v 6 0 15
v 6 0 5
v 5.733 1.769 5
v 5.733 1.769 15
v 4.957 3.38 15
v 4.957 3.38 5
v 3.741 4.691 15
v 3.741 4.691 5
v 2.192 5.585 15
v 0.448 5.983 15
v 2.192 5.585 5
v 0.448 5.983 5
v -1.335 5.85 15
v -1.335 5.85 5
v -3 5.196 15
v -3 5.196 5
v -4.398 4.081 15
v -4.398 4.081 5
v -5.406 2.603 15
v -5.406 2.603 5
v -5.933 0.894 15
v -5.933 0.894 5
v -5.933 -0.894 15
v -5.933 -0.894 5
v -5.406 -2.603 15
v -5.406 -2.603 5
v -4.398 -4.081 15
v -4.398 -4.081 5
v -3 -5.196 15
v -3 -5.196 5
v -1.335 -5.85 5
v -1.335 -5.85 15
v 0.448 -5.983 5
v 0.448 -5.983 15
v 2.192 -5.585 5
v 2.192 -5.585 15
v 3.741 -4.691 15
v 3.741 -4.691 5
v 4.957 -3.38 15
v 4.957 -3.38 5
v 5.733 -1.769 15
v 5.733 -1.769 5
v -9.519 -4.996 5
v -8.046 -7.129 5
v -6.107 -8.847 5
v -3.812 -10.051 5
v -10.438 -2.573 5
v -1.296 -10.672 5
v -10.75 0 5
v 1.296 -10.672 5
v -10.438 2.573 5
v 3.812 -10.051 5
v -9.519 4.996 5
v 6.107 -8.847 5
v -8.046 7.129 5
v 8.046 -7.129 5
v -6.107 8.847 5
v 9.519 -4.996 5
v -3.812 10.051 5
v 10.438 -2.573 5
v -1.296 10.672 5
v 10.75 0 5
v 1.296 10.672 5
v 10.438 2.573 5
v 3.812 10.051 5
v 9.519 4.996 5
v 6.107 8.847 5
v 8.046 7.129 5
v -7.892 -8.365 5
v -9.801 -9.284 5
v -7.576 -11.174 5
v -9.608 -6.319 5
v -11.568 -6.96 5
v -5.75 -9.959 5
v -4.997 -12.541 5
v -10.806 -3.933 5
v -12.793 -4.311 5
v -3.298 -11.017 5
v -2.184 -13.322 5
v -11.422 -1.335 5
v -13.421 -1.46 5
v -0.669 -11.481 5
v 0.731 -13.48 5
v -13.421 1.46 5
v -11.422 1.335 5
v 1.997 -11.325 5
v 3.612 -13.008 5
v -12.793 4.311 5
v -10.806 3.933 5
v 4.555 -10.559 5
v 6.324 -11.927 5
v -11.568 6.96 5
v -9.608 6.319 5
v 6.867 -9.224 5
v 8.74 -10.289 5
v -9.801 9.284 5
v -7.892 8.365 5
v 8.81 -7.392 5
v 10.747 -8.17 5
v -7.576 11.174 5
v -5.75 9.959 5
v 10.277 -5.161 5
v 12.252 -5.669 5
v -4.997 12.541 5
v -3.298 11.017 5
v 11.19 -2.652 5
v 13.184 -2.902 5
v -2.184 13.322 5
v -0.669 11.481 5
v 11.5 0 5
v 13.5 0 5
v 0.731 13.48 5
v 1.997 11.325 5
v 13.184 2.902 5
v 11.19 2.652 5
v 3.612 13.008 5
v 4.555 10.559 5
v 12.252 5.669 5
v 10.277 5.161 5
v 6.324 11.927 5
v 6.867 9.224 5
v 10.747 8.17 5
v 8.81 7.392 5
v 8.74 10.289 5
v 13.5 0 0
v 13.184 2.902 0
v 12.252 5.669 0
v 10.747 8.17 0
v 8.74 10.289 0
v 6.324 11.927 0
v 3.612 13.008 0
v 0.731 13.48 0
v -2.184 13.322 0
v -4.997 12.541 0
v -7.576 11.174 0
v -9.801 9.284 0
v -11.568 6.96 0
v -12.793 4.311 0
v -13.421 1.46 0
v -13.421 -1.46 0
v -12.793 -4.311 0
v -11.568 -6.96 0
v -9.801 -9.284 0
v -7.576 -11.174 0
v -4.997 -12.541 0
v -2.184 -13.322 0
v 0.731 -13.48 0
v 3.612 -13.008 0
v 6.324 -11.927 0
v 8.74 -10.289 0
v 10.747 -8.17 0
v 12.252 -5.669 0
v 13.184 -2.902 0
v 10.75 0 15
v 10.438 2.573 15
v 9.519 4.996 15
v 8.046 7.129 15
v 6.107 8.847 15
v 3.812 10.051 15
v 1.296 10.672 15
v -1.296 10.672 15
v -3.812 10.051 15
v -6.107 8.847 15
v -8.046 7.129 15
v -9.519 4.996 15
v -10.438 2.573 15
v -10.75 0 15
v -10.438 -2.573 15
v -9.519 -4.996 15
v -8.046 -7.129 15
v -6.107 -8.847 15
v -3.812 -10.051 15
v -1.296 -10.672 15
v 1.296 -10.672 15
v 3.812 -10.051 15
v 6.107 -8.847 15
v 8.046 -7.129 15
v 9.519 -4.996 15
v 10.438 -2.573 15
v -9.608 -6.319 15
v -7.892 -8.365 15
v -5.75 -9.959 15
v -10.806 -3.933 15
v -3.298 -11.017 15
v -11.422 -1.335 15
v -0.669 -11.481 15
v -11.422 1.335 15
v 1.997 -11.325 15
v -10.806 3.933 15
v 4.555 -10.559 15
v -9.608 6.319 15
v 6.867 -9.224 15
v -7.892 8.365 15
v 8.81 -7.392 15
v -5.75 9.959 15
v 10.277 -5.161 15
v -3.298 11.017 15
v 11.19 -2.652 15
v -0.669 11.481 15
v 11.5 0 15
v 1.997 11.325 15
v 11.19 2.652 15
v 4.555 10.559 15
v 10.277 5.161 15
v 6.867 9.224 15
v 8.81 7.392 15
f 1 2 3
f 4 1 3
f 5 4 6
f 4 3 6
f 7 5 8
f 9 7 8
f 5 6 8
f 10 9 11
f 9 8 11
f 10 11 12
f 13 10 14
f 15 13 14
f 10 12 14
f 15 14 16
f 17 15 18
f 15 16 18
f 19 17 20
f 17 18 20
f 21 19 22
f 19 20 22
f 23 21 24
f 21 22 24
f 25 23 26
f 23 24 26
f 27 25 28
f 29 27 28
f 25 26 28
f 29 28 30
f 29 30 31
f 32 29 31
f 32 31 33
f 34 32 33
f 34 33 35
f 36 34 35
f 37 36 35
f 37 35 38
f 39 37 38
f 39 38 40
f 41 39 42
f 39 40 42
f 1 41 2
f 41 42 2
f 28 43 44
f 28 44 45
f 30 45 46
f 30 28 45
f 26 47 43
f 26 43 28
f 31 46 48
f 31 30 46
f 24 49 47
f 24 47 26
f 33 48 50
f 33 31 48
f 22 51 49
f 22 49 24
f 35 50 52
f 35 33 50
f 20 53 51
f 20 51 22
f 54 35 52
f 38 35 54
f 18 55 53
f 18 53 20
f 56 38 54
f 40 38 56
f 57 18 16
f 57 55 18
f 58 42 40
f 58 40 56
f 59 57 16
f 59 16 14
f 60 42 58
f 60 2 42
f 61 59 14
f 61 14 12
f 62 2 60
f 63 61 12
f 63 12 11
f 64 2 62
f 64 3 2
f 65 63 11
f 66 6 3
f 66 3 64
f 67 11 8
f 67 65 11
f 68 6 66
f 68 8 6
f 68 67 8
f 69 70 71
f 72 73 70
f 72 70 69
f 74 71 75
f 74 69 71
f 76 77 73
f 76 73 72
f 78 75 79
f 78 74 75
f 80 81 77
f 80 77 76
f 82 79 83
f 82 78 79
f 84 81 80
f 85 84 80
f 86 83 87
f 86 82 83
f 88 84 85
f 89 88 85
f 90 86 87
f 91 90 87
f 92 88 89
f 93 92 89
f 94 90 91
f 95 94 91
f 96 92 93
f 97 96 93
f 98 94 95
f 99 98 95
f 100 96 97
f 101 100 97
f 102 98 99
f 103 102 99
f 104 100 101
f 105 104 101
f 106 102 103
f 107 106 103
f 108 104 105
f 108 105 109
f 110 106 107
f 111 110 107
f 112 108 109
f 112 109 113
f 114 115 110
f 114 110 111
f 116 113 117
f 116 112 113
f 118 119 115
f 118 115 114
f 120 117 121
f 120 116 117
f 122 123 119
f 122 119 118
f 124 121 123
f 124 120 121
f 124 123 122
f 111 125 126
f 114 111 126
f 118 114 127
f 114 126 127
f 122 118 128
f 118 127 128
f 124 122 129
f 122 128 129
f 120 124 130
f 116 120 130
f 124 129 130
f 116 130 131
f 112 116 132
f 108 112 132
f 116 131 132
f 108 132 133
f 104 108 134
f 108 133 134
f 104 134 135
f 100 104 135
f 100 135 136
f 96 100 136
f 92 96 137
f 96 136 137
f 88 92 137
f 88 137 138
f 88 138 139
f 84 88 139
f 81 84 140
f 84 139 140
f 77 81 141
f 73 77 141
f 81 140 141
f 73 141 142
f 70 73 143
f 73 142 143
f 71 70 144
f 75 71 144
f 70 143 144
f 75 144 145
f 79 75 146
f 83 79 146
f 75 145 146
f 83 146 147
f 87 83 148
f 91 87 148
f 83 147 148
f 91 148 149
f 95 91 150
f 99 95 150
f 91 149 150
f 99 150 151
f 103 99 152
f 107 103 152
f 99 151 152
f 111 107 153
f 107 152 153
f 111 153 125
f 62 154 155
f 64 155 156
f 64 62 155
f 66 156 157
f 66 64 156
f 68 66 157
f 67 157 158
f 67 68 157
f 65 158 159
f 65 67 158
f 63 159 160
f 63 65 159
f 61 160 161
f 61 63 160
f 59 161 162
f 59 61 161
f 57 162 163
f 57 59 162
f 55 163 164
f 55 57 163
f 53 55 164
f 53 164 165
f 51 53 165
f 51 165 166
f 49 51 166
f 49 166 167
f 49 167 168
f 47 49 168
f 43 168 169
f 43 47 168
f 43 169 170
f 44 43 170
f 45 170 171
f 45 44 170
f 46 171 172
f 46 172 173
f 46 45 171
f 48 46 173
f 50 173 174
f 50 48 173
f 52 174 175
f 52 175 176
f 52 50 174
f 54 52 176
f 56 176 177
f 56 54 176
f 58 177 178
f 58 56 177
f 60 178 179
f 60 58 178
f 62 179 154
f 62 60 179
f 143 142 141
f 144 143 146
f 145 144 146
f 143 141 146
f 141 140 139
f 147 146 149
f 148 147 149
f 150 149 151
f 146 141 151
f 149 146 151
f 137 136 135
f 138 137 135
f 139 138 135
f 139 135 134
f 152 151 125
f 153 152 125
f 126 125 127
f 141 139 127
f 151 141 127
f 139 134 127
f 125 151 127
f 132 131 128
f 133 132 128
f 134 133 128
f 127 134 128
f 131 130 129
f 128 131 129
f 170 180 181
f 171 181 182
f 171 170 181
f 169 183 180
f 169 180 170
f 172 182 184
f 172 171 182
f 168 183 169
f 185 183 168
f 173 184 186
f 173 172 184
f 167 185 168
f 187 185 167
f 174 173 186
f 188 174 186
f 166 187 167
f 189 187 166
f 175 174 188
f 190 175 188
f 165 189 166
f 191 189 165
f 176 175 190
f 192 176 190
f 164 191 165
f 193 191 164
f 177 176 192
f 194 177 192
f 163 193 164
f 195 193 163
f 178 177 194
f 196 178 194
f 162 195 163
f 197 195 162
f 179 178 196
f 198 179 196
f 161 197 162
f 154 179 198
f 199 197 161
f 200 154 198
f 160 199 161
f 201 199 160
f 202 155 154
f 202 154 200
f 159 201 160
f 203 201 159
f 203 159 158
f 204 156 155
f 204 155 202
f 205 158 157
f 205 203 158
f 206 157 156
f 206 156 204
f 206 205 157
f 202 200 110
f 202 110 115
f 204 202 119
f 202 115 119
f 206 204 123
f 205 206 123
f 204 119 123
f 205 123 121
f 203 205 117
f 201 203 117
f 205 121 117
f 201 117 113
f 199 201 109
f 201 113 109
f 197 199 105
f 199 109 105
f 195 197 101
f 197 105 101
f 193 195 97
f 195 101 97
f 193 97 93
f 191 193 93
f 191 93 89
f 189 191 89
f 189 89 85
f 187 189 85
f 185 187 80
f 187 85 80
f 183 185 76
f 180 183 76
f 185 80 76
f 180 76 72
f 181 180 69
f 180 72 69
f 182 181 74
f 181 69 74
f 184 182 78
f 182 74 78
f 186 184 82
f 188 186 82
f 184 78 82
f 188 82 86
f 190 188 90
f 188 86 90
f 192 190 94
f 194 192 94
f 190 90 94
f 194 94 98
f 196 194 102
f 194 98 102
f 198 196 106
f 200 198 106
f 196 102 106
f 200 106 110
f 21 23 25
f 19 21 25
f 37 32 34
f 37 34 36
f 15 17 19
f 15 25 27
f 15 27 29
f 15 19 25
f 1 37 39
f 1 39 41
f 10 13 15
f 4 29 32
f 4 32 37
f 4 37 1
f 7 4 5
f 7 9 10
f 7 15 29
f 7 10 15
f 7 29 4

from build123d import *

# Parameters (mm, degrees)
SKETCH1_R           = 13.5
BOSS_EXTRUDE1_DEPTH = 5
SKETCH2_R           = 11.5
SKETCH2_R_2         = 10.75
BOSS_EXTRUDE2_DEPTH = 10
SKETCH3_R           = 6
BOSS_EXTRUDE3_DEPTH = 10


with BuildPart() as part:
    # Sketch1 → Boss-Extrude1 (new body)
    with BuildSketch(Plane.XY):
        Circle(SKETCH1_R)
    extrude(amount=BOSS_EXTRUDE1_DEPTH)

    # Sketch2 → Boss-Extrude2 (add)
    with BuildSketch(Plane.XY.offset(5)):
        Circle(SKETCH2_R)
        Circle(SKETCH2_R_2, mode=Mode.SUBTRACT)
    extrude(amount=BOSS_EXTRUDE2_DEPTH)

    # Sketch3 → Boss-Extrude3 (add)
    with BuildSketch(Plane.XY.offset(5)):
        Circle(SKETCH3_R)
    extrude(amount=BOSS_EXTRUDE3_DEPTH)


solid = part.part
